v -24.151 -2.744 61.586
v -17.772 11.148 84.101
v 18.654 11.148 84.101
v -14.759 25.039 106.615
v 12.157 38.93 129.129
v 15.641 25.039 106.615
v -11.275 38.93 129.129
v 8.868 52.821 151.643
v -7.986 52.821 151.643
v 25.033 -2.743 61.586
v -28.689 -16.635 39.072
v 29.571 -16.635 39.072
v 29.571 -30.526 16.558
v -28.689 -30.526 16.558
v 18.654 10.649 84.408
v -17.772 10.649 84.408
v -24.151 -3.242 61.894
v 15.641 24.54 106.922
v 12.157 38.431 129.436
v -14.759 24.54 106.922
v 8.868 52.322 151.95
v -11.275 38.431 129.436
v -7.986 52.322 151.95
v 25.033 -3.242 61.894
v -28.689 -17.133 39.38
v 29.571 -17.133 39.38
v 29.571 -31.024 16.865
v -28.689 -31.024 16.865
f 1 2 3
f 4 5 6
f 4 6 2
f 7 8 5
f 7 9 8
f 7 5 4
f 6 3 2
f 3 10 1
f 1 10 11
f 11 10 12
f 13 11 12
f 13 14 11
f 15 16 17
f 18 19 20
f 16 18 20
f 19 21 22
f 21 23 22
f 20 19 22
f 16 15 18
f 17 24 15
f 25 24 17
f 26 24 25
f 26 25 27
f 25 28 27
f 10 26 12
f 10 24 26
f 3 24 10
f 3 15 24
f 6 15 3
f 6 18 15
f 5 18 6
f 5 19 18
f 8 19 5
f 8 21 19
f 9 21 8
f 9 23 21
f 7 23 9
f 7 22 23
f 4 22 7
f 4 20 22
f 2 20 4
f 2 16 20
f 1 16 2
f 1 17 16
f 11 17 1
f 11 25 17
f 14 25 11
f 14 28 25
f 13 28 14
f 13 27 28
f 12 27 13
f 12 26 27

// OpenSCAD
// sb_harp_white_wood_01 — soundboard face (flat tapered plate)
//
// Construction choice: FLAT PLATE -> linear_extrude(thickness) of a 2D outline.
// Justification (from analysis JSON):
//   obb_dims = [158.728, 58.260, 0.586]. The third OBB extent (0.586) is ~270x
//   smaller than the other two -> a thin flat plate lying in the e0-e1 plane with
//   its thickness along e2. Every cross-section outline has an e2 spread of only
//   ~0.02-0.06 confirming the slab is essentially planar.
//   The outline is symmetric in e1 and tapers monotonically in width from 58.26
//   (at e0=-56.2) down to 16.86 (at e0=+102.5) -> a tapered trapezoid-ish plate.
//   So: build the tapered outline in the (e0,e1) plane and extrude it by the
//   measured thickness along e2. Placed at original world coords via multmatrix.

module sb_harp_white_wood_01() {
    // --- key dimensions (model world units), from JSON ---
    thickness = 0.5855474371629796;            // obb_dims[2], slab thickness (along e2)
    e2_mid    = (-0.06552327076825293 + 0.5200241663947267) / 2; // outline mid-plane offset in e2

    // principal frame (columns e1,e2,e0) + centroid, from JSON
    // world = centroid + u*e1 + v*e2 + w*e0 ; local: x=u(e1), y=v(e2), z=w(e0)
    // centroid
    cx = 0.44119784559796194;
    cy = -1.4524250851382396;
    cz = 64.66925852212562;
    // e1 (principal_axes[1])
    e1x = 0.9999999999999987;  e1y = 5.101571019845674e-08;  e1z = 1.1910700121443101e-08;
    // e2 (principal_axes[2])
    e2x = -3.7162652564615806e-08; e2y = 0.8510479848443533; e2z = -0.525087923582674;
    // e0 (principal_axes[0])
    e0x = -3.692431067464216e-08; e0y = 0.5250879235826725; e0z = 0.851047984844354;

    // --- tapered outline in the (e0 , e1) plane ---
    // each row: [s_along_e0, half_width_in_e1]   (outline is symmetric in e1)
    s_hw = [
        [ -56.210913273070176, 29.130 ],
        [ -29.756272516140438, 29.130 ],
        [  -3.3016317592107,   24.592 ],
        [  23.15300899771904,  18.213 ],
        [  49.607649754648776, 15.200 ],
        [  76.06229051157852,  11.716 ],
        [ 102.51693126850826,   8.427 ]
    ];
    n = len(s_hw);

    // build closed polygon in the (e1 , e0) plane: x = e1, y = e0
    // down the +e1 edge (top->bottom in e0), back up the -e1 edge
    pts_pos = [ for (i=[0:n-1])    [  s_hw[i][1], s_hw[i][0] ] ];
    pts_neg = [ for (i=[n-1:-1:0]) [ -s_hw[i][1], s_hw[i][0] ] ];
    poly = concat(pts_pos, pts_neg);   // (x=e1, y=e0)

    multmatrix([[e1x, e2x, e0x, cx],
                [e1y, e2y, e0y, cy],
                [e1z, e2z, e0z, cz],
                [0,   0,   0,   1]]) {
        // Local target frame: x=e1, y=e2(thickness), z=e0.
        // Extrude poly (x=e1, y=e0) along z by thickness, then rotate([90,0,0]):
        //   (x,y,z) -> (x, -z, y)  => local_x=e1, local_y=-thickness, local_z=e0.
        translate([0, e2_mid, 0])      // shift to outline mid-plane along local y (e2)
            rotate([90, 0, 0])         // map extrude axis -> local y, poly-y(e0) -> local z
                linear_extrude(height = thickness, center = true)
                    polygon(points = poly);
    }
}

sb_harp_white_wood_01();
